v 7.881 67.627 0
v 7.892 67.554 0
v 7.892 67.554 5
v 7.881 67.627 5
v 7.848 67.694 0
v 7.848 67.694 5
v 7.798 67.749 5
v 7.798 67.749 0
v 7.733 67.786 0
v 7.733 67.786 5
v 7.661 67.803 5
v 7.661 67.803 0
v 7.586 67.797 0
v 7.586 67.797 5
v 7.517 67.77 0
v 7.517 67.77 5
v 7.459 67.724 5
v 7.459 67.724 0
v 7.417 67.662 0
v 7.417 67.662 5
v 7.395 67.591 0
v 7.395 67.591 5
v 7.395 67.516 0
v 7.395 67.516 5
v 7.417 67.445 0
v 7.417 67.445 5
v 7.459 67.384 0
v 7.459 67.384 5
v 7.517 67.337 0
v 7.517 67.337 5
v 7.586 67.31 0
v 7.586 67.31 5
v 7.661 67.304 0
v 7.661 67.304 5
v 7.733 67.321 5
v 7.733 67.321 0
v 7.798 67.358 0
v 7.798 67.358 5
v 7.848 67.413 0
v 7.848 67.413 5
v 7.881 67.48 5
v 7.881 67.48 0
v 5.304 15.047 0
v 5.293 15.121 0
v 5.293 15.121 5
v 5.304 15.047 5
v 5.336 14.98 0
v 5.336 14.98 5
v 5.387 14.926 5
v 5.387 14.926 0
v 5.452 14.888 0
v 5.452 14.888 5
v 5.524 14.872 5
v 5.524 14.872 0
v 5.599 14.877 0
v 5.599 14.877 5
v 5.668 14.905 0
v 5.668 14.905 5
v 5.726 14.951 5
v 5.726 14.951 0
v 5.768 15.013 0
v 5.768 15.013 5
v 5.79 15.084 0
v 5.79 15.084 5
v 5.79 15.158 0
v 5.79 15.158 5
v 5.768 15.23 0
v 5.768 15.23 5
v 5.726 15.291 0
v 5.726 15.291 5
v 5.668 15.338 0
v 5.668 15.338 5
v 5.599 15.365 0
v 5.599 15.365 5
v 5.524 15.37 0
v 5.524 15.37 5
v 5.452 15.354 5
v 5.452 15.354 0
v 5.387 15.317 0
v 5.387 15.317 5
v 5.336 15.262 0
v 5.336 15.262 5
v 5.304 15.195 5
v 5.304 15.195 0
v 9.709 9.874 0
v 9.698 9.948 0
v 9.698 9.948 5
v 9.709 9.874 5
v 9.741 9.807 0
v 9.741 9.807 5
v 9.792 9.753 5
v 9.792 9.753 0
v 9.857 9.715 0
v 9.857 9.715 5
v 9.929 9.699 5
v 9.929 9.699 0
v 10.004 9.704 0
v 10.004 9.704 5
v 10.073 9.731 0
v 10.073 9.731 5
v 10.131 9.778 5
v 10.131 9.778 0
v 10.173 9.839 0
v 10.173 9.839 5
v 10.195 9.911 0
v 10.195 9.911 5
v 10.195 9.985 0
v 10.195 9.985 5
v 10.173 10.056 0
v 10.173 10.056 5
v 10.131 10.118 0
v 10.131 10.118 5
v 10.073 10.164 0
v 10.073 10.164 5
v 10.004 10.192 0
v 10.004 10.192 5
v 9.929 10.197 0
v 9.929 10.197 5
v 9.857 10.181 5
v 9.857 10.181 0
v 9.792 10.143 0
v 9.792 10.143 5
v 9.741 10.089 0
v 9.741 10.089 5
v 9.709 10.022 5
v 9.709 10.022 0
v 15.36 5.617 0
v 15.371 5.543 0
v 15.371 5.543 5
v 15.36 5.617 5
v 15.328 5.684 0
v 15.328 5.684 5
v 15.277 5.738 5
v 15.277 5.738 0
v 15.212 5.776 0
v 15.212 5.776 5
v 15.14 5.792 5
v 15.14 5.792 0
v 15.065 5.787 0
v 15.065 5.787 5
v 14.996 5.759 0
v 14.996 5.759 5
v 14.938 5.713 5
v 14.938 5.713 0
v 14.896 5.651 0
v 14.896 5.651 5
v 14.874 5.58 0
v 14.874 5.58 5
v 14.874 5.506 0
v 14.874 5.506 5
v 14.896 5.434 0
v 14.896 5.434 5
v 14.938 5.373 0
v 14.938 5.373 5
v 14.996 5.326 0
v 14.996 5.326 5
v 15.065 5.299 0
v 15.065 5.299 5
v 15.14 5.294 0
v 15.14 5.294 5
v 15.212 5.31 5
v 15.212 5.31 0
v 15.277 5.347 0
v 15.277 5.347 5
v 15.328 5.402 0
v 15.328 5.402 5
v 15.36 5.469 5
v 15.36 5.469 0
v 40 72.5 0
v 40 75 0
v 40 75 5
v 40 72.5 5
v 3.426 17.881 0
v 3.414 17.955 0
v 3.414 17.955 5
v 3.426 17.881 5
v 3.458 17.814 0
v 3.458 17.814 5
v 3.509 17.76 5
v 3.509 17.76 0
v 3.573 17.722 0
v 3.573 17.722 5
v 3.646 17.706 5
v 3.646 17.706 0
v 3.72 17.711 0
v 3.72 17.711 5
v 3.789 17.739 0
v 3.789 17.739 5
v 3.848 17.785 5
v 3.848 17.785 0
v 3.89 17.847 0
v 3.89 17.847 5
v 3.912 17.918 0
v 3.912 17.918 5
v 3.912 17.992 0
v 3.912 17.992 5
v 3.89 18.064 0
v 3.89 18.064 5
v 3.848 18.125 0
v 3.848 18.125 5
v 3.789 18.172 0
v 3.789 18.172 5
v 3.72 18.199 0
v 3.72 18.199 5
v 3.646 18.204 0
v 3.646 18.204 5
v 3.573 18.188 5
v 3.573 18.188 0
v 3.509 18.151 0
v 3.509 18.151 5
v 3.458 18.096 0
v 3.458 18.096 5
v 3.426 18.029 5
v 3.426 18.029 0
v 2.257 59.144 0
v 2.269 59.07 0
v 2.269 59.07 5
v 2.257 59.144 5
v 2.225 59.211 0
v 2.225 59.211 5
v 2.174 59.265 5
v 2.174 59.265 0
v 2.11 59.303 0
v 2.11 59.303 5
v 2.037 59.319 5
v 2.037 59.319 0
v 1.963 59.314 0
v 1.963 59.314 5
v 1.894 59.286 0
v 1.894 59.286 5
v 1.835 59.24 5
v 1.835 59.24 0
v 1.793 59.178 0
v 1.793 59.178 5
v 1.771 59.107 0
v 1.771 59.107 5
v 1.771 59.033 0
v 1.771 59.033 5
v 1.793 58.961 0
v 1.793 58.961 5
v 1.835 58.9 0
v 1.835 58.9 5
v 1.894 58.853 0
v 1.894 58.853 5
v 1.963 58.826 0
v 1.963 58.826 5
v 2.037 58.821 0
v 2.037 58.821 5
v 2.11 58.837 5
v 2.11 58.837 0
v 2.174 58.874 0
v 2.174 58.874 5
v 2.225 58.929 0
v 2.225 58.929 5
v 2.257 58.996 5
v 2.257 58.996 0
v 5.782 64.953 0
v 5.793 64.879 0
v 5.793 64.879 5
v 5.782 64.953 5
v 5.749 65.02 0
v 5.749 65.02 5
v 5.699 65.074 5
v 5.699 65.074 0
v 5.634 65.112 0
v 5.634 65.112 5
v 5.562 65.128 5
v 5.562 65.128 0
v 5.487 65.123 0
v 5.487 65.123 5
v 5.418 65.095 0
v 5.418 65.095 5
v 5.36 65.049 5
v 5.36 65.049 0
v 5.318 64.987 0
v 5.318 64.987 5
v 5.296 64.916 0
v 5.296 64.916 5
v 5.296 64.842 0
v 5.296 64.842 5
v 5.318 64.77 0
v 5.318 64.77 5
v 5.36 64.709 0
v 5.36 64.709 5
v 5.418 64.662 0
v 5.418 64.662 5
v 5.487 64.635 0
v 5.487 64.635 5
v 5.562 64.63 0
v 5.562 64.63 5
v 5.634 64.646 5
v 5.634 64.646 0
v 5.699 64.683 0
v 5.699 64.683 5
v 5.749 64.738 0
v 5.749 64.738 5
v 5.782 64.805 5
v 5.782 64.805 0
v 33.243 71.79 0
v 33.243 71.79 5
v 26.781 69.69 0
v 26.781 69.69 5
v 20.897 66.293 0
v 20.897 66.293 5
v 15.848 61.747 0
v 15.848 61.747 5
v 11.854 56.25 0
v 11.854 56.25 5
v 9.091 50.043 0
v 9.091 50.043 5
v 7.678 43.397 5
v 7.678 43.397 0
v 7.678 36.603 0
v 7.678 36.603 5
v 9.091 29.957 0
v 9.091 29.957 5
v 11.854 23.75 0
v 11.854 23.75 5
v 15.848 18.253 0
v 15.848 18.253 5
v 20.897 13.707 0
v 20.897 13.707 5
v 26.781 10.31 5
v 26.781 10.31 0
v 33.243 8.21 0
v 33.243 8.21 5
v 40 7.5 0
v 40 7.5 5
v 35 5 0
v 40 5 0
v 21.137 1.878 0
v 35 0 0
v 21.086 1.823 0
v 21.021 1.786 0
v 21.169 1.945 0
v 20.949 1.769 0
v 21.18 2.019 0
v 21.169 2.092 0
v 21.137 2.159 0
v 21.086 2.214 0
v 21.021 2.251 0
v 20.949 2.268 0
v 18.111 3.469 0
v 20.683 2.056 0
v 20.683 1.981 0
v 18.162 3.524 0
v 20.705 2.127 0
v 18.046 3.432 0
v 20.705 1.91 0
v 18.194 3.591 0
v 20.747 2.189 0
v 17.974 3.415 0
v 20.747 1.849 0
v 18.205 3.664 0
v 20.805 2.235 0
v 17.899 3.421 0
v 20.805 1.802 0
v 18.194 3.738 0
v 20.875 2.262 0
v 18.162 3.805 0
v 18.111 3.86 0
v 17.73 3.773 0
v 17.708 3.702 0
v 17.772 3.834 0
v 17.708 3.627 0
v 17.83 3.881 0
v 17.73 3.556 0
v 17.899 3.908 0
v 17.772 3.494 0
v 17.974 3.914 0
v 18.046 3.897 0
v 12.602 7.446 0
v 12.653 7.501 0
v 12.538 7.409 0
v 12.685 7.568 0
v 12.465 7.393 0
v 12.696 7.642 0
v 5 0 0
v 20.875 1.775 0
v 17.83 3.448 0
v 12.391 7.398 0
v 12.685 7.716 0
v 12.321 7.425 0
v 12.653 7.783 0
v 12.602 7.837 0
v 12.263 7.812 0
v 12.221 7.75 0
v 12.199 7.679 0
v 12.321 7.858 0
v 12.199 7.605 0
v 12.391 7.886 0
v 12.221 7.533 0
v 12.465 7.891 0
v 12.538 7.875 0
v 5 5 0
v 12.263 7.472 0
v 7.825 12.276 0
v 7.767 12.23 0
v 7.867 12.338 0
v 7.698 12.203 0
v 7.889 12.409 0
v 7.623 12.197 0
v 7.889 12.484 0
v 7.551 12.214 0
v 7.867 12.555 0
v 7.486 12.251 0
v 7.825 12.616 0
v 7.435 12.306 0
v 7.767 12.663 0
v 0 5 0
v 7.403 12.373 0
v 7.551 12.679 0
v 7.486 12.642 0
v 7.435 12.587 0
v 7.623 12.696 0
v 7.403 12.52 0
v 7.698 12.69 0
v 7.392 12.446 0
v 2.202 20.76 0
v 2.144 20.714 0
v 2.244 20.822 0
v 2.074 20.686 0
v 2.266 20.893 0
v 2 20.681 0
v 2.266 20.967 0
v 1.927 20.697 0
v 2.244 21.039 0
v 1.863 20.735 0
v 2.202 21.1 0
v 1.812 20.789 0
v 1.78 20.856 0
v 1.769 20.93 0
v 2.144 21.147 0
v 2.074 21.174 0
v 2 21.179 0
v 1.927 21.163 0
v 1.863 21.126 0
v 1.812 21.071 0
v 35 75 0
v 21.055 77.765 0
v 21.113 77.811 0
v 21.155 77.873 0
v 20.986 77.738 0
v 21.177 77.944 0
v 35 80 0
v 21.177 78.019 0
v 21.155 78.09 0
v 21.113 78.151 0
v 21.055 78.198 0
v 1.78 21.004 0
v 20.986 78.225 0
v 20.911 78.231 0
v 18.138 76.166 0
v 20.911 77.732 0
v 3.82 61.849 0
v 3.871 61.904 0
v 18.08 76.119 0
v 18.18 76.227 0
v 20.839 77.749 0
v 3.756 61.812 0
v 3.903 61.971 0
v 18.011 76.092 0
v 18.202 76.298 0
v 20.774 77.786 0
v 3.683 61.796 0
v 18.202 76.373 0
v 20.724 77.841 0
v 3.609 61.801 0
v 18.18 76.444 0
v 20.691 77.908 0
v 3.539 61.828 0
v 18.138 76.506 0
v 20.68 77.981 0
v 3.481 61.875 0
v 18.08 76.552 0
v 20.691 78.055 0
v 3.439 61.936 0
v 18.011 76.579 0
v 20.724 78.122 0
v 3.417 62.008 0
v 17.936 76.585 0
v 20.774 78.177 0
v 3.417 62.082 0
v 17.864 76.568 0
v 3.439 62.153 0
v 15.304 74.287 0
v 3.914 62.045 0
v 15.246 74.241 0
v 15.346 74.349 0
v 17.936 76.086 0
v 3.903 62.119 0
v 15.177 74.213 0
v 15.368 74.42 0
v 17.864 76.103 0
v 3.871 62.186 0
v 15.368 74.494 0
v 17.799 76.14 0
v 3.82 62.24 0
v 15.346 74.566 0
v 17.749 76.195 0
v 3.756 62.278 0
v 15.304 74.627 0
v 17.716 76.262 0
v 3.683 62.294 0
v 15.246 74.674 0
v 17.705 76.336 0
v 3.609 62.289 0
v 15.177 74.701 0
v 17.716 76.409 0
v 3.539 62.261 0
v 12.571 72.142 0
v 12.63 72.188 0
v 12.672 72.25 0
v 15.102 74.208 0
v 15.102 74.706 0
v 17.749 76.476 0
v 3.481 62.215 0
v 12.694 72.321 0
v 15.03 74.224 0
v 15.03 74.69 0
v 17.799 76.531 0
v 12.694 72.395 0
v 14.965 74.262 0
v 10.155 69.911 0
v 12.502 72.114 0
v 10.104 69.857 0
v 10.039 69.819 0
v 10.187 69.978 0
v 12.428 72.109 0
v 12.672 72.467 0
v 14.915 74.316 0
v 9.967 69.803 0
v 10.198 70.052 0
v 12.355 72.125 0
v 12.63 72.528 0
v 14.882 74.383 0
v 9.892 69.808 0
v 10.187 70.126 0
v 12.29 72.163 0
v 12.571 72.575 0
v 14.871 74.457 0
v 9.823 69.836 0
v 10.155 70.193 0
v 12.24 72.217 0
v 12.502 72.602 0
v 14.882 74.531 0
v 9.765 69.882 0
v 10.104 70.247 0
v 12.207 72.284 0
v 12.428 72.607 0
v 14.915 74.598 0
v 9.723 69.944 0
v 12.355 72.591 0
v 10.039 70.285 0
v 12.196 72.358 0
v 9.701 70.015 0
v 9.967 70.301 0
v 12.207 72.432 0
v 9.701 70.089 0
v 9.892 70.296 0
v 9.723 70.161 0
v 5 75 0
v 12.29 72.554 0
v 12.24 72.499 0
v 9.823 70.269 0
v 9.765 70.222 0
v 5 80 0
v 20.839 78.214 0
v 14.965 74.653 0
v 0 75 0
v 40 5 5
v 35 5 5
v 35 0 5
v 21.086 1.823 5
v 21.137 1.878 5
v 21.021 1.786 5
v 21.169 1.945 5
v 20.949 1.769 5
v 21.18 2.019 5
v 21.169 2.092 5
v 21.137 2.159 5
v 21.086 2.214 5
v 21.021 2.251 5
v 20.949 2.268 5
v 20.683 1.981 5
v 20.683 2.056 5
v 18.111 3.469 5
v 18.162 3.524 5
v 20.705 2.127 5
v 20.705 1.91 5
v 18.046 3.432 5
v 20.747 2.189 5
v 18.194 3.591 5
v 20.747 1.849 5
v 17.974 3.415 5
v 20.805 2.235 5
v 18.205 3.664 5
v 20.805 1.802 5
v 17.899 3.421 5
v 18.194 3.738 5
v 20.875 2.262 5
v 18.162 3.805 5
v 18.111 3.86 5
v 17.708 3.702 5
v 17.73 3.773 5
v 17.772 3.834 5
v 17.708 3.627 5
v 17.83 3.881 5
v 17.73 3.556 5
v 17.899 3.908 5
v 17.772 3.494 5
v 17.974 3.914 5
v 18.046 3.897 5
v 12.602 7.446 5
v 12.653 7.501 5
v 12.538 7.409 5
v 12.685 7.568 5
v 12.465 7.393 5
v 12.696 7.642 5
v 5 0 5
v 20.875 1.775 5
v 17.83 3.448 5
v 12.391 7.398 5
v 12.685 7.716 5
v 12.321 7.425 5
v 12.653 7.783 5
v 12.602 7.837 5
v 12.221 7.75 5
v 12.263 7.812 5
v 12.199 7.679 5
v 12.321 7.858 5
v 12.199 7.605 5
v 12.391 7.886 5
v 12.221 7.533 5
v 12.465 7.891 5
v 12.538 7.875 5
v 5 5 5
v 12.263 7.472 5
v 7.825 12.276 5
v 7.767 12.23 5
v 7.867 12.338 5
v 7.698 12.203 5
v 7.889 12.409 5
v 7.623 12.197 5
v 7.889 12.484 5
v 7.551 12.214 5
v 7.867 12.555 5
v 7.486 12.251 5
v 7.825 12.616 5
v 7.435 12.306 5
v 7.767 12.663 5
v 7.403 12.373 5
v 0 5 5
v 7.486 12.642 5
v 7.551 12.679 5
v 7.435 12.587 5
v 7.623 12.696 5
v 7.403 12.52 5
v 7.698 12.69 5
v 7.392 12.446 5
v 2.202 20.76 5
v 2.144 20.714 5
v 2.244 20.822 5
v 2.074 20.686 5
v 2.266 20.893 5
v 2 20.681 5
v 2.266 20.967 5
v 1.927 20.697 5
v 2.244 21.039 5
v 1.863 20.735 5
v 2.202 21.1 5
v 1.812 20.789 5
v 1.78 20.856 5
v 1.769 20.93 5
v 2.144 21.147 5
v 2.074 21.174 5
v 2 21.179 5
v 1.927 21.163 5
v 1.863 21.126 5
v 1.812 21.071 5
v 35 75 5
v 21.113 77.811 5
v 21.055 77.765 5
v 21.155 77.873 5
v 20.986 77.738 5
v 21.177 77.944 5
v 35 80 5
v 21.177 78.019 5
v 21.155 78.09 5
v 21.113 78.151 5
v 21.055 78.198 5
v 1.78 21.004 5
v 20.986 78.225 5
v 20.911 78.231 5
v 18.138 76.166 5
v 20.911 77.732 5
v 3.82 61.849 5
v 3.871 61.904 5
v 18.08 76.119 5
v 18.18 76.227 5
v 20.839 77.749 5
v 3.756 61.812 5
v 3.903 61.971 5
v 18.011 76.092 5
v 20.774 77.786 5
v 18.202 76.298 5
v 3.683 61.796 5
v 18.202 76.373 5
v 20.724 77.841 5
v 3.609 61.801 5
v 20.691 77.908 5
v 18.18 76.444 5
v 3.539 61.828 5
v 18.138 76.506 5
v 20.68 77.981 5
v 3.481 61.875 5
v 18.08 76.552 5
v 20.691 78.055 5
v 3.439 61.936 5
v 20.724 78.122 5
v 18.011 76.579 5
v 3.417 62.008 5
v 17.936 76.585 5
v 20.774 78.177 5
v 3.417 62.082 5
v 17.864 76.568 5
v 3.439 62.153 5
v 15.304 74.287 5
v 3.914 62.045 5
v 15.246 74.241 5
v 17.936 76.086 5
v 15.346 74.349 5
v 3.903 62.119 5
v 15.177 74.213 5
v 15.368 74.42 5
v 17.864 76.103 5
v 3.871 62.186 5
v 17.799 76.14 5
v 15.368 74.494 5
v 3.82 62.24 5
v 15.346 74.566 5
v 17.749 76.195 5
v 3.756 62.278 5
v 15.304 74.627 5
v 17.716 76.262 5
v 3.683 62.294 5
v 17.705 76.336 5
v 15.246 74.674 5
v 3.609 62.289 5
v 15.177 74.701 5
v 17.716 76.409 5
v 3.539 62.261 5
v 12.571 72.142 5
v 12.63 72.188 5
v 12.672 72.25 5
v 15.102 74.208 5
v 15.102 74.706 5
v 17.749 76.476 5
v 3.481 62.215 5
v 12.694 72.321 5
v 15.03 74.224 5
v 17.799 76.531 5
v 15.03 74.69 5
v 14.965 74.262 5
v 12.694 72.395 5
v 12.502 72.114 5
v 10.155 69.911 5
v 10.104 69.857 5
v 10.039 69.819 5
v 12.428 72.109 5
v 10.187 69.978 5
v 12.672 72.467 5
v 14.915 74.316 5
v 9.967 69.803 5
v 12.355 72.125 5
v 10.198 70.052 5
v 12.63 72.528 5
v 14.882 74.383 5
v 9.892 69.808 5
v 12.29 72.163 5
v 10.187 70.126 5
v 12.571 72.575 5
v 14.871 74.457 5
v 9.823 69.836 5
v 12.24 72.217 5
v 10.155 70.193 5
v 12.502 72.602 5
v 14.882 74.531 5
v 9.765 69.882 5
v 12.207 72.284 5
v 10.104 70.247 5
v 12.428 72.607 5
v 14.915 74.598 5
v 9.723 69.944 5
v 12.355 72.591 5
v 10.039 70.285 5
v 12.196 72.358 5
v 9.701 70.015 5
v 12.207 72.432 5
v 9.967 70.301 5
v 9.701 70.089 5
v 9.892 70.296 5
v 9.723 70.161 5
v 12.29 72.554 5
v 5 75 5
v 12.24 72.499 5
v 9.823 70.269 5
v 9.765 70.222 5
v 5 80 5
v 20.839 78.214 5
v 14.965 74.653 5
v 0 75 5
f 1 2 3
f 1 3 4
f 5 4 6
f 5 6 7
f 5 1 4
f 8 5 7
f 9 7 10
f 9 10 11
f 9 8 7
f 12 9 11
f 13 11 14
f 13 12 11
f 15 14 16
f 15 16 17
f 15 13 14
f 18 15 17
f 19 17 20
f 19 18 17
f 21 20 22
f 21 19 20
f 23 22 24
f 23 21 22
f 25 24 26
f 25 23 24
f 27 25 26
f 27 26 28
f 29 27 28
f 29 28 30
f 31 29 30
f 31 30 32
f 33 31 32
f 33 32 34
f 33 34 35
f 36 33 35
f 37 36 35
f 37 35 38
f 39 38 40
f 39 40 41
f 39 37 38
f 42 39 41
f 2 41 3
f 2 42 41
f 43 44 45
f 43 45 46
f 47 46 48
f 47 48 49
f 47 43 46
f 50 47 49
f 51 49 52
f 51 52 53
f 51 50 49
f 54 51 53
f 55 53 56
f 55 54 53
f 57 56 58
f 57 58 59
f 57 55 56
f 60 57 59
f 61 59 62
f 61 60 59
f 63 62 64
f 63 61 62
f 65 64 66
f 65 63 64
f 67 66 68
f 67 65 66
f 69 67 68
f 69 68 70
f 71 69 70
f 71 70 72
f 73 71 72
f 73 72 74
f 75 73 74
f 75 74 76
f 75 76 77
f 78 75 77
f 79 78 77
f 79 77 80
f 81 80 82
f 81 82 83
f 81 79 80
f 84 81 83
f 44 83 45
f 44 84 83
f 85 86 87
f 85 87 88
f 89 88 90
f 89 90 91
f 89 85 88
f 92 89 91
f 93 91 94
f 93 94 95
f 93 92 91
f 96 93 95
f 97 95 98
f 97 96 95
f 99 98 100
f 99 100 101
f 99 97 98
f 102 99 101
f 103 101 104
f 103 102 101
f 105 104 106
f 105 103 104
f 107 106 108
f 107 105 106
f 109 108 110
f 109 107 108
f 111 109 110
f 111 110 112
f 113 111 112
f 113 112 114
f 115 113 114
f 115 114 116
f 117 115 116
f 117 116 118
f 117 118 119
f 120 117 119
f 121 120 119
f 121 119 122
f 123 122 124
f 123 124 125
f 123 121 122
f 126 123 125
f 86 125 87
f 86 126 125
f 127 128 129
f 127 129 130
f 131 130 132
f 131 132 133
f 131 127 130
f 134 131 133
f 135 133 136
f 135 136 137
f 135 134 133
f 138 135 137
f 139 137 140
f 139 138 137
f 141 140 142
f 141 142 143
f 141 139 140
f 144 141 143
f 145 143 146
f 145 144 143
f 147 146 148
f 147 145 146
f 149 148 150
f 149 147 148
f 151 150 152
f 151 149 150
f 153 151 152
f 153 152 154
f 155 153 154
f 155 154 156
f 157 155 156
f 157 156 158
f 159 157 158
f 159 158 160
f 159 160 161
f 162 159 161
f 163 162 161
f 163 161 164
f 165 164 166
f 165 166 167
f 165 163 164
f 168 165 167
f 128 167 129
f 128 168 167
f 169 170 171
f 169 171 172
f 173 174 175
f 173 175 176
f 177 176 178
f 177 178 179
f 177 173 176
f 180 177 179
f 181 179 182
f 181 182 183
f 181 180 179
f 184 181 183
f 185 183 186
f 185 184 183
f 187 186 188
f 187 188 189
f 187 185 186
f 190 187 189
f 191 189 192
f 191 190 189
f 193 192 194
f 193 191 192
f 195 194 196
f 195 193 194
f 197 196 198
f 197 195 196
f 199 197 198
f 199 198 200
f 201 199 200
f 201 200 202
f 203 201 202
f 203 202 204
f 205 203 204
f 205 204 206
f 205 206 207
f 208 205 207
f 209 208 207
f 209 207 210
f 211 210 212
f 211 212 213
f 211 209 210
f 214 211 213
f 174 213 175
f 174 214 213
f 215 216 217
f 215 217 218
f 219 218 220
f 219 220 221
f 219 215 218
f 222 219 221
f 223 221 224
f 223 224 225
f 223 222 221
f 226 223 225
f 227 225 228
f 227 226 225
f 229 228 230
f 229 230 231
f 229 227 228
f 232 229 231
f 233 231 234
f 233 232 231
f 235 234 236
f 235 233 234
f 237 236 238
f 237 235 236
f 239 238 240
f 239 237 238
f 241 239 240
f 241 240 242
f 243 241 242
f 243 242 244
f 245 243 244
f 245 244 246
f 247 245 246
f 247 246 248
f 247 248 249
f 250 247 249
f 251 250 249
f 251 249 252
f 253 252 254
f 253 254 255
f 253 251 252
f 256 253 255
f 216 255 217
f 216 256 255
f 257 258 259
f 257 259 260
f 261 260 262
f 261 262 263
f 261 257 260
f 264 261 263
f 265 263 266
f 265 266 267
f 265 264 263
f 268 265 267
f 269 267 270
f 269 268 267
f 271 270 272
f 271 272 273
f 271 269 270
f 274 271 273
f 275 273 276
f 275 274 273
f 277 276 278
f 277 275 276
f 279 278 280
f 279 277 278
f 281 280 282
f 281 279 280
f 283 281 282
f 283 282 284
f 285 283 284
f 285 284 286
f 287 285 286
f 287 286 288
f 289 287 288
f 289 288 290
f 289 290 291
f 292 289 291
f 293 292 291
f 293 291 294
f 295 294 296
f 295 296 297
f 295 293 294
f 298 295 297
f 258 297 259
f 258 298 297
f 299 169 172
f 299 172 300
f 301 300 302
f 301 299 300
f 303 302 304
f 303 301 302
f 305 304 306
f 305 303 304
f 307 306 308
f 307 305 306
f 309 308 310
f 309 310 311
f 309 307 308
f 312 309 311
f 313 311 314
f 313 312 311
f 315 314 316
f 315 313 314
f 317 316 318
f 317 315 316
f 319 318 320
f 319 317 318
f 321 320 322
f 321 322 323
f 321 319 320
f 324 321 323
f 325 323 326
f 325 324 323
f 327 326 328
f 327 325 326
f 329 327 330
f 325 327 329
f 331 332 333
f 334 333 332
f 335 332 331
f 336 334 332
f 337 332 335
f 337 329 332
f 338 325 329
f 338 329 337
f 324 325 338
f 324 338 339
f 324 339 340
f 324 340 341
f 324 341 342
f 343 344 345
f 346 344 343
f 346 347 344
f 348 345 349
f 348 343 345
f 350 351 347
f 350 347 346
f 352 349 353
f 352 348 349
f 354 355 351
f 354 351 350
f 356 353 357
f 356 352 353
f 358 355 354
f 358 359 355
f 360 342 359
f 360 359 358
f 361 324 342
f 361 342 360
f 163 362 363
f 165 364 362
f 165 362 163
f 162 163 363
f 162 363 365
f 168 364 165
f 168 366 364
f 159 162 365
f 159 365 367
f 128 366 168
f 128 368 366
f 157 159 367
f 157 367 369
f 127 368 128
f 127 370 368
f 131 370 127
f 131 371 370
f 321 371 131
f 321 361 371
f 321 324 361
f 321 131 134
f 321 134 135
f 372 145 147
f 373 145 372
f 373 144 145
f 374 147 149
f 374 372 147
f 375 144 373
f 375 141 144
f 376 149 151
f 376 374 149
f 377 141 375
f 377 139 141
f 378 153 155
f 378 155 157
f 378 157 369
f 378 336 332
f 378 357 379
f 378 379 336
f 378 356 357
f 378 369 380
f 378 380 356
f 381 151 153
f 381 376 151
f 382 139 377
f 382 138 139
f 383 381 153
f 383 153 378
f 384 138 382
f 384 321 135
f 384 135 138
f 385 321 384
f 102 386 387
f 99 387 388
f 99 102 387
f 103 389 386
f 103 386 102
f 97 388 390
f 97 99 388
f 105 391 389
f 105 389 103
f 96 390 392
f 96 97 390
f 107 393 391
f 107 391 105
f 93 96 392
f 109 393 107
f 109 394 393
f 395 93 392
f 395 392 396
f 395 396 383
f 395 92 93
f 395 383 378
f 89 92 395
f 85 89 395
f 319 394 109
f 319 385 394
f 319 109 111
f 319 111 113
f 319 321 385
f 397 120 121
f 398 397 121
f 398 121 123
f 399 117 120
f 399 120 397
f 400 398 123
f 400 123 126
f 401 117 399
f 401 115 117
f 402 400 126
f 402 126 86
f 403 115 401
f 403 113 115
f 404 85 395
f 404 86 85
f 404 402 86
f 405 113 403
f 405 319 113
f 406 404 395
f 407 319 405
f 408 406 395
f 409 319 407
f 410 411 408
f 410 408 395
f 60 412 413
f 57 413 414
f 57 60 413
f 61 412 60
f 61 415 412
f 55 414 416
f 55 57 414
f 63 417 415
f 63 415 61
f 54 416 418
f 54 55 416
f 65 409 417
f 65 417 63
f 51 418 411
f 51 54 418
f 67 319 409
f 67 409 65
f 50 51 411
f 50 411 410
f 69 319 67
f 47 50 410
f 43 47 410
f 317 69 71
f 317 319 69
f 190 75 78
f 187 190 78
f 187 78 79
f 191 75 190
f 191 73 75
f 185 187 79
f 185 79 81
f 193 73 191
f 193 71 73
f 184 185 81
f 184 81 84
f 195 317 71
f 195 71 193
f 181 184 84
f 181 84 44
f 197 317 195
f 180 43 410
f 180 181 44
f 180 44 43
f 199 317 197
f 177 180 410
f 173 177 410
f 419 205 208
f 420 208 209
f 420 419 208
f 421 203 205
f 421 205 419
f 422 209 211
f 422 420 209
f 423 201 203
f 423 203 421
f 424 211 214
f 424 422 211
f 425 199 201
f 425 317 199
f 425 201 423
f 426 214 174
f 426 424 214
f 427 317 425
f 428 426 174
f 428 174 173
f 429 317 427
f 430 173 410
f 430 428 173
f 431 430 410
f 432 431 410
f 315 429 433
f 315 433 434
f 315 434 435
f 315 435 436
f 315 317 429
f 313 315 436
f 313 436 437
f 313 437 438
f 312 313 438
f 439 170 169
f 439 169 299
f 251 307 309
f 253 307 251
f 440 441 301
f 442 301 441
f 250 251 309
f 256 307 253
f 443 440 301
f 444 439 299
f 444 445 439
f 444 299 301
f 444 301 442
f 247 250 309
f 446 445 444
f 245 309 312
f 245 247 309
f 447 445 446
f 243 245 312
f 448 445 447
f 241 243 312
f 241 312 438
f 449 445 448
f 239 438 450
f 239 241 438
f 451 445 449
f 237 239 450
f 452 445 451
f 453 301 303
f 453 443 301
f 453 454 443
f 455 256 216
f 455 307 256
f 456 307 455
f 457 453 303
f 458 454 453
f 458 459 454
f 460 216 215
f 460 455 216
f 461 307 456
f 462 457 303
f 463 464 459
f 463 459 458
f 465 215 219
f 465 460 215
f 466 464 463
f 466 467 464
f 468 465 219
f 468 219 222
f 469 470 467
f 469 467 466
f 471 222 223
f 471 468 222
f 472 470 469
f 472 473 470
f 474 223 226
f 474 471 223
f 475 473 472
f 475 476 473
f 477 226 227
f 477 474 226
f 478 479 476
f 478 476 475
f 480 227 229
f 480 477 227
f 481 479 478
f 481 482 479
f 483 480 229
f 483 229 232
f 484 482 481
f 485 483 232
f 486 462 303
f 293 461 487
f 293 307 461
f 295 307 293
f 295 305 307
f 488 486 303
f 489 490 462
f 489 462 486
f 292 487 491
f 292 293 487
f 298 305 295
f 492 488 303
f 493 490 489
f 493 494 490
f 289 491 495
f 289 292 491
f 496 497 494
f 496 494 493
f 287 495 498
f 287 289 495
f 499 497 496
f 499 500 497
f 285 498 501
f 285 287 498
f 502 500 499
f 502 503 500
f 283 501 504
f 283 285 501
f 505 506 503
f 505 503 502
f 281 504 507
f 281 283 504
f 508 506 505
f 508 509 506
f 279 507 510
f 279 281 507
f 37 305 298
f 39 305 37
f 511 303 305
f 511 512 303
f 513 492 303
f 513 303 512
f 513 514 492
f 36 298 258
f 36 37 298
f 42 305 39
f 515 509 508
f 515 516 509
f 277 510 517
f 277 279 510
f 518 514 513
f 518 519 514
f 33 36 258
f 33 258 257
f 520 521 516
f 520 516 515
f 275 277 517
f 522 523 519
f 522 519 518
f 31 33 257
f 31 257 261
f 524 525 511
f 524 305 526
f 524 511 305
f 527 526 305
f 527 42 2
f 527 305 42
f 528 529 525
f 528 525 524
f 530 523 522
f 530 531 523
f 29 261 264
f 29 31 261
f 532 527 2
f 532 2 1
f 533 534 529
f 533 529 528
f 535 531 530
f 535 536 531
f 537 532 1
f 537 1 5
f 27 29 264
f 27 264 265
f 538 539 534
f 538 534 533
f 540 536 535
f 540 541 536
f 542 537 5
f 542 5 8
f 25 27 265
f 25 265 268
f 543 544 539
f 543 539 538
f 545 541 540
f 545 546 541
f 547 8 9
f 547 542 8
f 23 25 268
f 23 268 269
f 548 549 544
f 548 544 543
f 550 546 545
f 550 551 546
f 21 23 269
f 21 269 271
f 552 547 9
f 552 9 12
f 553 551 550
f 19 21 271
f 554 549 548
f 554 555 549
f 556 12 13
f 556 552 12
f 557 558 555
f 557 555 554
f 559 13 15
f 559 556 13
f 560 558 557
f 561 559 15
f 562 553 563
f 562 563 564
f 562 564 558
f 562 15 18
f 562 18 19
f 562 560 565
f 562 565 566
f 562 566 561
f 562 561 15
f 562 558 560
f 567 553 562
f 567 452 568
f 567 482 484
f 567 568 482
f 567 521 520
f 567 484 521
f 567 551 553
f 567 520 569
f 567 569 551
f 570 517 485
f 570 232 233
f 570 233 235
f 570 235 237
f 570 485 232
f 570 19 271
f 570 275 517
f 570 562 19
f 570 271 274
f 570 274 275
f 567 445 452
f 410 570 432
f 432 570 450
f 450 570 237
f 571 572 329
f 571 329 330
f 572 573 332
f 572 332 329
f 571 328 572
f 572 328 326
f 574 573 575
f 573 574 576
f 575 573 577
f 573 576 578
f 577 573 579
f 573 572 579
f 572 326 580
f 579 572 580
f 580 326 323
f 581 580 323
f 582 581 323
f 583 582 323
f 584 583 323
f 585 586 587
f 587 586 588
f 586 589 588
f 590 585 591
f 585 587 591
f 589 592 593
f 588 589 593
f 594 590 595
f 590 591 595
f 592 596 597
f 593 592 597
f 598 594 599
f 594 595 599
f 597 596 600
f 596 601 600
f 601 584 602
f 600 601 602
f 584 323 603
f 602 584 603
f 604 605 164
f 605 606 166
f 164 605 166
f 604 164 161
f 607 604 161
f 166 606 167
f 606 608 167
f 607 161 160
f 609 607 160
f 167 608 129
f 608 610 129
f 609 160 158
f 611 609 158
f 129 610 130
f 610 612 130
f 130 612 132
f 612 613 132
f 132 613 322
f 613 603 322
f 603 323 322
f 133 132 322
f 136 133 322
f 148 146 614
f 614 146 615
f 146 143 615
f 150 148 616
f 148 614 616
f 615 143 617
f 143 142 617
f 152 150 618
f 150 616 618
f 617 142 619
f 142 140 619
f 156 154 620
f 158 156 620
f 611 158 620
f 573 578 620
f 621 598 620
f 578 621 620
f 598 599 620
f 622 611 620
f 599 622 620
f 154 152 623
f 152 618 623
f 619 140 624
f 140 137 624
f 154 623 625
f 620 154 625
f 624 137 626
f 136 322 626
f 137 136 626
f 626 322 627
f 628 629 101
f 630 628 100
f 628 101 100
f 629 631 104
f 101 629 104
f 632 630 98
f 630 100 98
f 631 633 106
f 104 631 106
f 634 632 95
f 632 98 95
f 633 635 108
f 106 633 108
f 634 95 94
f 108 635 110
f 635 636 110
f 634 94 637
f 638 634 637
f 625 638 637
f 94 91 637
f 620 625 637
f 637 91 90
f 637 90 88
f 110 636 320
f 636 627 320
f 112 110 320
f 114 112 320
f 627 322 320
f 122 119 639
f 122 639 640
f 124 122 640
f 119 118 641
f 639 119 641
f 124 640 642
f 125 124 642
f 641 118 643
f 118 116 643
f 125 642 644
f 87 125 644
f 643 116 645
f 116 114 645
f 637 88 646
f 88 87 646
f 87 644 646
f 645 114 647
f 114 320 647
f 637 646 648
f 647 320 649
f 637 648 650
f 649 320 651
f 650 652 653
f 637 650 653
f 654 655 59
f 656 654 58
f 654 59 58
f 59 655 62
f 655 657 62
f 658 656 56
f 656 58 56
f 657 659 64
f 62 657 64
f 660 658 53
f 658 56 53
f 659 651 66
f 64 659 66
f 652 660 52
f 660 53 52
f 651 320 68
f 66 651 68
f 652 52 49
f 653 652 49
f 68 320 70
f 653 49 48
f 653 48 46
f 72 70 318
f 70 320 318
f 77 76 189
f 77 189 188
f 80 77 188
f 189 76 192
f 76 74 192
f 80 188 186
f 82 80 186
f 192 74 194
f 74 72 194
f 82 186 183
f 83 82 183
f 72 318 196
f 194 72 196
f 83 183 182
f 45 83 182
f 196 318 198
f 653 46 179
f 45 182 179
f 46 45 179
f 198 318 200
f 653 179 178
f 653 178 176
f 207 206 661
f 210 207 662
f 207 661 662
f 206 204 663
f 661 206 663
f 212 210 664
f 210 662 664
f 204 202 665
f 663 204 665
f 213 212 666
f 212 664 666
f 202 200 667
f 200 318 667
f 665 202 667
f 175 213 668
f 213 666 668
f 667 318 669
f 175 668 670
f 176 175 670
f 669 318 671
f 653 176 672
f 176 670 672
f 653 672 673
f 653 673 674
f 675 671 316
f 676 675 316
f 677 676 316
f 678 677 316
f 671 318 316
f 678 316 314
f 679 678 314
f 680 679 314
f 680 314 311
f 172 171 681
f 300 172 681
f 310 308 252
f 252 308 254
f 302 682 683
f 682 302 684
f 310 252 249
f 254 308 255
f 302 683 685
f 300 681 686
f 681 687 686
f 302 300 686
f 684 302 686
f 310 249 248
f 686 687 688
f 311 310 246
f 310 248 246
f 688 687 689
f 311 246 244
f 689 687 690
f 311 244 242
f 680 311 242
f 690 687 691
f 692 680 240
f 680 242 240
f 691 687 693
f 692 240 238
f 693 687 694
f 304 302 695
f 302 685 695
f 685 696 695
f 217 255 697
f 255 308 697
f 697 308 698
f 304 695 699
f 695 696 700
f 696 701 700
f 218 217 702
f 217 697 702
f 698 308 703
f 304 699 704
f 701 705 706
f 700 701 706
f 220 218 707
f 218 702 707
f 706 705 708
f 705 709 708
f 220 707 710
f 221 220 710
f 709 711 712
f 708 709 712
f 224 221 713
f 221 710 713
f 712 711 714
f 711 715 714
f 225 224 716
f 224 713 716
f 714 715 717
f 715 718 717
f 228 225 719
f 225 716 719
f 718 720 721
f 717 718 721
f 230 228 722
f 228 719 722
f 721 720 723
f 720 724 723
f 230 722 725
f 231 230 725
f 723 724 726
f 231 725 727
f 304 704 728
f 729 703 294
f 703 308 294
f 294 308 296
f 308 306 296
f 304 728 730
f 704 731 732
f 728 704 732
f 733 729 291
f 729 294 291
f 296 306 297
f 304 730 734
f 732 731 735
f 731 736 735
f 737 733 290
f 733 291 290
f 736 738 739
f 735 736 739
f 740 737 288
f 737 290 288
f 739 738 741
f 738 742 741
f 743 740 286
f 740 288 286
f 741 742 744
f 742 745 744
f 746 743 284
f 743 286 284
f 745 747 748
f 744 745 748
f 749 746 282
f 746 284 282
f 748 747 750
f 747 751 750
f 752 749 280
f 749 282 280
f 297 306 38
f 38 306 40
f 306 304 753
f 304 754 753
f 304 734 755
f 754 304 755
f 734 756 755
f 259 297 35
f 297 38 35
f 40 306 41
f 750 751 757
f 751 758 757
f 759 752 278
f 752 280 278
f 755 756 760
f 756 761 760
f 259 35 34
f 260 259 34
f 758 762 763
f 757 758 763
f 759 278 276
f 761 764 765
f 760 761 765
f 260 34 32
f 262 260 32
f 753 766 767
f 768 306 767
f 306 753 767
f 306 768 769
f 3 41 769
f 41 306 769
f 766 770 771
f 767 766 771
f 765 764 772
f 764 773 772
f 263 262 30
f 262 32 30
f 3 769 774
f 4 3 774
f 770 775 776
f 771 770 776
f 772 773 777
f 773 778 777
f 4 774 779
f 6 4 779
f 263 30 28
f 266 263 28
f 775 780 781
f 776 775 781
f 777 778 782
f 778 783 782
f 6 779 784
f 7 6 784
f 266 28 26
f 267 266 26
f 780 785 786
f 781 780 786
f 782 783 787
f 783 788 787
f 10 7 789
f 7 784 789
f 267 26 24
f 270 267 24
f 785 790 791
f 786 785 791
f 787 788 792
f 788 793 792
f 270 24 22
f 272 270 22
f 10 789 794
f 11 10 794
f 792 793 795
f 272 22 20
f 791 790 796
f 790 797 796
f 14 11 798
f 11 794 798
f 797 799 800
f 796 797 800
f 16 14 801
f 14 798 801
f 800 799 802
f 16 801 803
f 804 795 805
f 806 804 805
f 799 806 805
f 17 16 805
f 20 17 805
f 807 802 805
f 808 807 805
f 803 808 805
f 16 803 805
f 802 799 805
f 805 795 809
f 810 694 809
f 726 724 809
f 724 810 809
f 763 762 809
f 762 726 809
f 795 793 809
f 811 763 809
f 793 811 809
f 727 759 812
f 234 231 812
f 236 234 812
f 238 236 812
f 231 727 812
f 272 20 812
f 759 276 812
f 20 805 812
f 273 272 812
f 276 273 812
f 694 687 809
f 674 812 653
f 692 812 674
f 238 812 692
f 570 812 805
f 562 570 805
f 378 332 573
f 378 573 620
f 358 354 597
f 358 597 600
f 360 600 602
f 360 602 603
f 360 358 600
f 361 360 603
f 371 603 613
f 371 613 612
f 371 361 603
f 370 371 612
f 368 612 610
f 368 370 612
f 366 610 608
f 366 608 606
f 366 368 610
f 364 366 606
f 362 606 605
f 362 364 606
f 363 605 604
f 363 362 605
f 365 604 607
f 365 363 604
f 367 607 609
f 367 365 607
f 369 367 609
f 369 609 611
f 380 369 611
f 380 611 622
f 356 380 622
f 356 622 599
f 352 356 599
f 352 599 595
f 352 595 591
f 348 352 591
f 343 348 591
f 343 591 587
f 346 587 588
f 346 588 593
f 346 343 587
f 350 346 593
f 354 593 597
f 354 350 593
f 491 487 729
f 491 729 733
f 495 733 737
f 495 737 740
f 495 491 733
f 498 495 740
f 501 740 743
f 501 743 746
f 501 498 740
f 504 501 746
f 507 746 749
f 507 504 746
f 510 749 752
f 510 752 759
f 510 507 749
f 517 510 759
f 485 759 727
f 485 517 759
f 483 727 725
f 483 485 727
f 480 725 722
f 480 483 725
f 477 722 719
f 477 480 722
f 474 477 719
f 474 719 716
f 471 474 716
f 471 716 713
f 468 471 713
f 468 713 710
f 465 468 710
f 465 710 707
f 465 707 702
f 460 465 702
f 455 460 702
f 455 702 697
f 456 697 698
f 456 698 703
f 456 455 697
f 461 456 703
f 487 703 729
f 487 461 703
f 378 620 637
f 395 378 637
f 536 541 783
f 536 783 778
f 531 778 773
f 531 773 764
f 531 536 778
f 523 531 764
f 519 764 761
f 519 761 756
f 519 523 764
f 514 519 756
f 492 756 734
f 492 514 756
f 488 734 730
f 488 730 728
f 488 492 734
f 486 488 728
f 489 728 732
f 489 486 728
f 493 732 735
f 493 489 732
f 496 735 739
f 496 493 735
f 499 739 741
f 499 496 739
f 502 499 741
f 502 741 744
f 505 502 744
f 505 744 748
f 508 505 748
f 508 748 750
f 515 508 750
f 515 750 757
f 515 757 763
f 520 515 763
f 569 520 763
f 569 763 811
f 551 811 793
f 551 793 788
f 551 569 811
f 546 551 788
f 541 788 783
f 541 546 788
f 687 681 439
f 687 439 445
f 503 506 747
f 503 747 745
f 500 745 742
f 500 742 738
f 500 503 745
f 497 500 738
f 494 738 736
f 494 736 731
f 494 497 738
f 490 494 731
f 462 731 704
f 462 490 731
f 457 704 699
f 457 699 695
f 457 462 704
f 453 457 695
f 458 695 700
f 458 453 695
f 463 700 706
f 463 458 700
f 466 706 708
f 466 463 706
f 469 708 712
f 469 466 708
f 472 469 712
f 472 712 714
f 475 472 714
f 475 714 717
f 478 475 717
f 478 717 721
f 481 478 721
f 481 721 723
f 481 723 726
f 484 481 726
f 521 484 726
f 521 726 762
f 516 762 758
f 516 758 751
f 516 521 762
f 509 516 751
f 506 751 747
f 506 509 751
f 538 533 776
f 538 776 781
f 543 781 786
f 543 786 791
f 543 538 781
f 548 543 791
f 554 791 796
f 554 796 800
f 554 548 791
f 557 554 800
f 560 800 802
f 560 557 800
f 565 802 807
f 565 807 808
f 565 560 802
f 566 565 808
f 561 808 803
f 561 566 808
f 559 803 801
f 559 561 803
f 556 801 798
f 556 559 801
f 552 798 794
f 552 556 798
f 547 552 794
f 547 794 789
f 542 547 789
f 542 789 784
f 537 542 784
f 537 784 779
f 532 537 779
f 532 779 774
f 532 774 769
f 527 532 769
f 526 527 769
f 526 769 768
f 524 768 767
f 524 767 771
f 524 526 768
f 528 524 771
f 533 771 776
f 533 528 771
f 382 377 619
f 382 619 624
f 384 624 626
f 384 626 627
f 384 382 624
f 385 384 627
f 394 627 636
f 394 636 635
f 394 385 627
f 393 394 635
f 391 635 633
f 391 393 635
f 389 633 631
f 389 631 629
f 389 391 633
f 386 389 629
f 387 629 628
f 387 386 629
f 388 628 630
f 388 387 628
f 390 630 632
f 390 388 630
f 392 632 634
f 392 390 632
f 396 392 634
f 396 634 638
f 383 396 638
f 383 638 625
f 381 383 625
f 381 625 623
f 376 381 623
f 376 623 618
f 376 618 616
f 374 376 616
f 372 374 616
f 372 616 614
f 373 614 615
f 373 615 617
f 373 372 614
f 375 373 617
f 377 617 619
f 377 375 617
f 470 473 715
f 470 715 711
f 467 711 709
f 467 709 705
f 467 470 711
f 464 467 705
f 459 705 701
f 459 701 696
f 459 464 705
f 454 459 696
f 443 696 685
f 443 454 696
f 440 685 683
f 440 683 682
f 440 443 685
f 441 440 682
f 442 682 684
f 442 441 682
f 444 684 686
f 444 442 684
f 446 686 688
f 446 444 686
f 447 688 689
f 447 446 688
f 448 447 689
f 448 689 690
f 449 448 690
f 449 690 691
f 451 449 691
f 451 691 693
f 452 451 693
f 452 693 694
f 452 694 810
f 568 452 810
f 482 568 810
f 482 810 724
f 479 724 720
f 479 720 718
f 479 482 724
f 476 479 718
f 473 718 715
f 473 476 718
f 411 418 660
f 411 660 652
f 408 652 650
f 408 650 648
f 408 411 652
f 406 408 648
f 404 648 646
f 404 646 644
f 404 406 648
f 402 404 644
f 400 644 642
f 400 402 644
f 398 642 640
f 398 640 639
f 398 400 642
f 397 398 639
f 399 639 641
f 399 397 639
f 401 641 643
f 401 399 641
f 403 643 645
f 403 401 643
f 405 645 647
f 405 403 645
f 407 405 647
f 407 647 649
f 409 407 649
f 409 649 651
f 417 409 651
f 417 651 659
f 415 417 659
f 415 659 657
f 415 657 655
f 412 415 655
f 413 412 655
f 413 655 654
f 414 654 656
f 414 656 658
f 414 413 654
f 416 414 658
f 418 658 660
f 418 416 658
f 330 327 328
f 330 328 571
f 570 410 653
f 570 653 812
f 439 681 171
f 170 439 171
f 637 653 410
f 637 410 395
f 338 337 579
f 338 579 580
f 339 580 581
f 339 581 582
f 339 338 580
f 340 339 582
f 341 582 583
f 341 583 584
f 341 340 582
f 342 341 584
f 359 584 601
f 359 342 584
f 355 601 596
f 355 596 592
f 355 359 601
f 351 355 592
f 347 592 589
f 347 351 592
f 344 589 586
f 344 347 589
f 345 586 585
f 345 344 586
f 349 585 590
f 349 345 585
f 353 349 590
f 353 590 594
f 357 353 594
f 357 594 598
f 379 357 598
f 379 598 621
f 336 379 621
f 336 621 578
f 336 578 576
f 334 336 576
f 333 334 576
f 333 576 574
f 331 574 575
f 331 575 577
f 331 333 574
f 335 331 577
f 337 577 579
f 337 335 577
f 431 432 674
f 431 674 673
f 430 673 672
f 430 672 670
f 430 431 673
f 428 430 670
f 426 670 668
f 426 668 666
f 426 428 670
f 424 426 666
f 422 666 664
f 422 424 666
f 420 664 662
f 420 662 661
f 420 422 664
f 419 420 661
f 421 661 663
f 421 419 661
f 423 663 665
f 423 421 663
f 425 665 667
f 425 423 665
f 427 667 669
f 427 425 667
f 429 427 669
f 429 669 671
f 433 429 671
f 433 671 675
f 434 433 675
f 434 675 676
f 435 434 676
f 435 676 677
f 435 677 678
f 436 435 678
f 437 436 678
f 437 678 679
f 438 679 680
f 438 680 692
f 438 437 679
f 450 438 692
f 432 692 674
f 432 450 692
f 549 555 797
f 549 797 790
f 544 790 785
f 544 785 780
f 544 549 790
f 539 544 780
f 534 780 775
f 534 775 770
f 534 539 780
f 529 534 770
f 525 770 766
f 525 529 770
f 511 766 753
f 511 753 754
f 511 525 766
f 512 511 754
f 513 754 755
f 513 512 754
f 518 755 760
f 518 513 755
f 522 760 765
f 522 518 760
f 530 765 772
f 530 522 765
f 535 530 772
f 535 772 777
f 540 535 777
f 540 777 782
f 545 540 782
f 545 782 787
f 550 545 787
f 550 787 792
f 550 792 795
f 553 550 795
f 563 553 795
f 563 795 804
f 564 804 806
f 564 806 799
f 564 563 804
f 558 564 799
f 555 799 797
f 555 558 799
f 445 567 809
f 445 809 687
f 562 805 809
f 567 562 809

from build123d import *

# Parameters (mm, degrees)
ESQUISSE1_R             = 0.25
BOSS_EXTRU_1_DEPTH      = 5
ESQUISSE2_W             = 5
ESQUISSE2_H             = 5
ENL_V_MAT_EXTRU_1_DEPTH = 5


with BuildPart() as part:
    # Esquisse1 → Boss.-Extru.1 (new body)
    with BuildSketch(Plane.XY):
        with BuildLine():
            Line((0, 80), (40, 80))
            Line((40, 80), (40, 72.5))
            ThreePointArc((40, 72.5), (7.5, 40), (40, 7.5))
            Line((40, 7.5), (40, 0))
            Line((40, 0), (0, 0))
            Line((0, 0), (0, 80))
        make_face()
        with Locations((2.018546053, 59.069849399)):
            Circle(ESQUISSE1_R, mode=Mode.SUBTRACT)
        with Locations((7.641889366, 67.553632723)):
            Circle(ESQUISSE1_R, mode=Mode.SUBTRACT)
        with Locations((9.9479618, 70.0520382)):
            Circle(ESQUISSE1_R, mode=Mode.SUBTRACT)
        with Locations((3.664453699, 62.04491041)):
            Circle(ESQUISSE1_R, mode=Mode.SUBTRACT)
        with Locations((5.542908841, 64.878883995)):
            Circle(ESQUISSE1_R, mode=Mode.SUBTRACT)
        with Locations(Location((20.930150601, 77.981453947, 0), (0, 0, 180))):
            Circle(ESQUISSE1_R, mode=Mode.SUBTRACT)
        with Locations(Location((17.95508959, 76.335546301, 0), (0, 0, 180))):
            Circle(ESQUISSE1_R, mode=Mode.SUBTRACT)
        with Locations(Location((15.121116005, 74.457091159, 0), (0, 0, 180))):
            Circle(ESQUISSE1_R, mode=Mode.SUBTRACT)
        with Locations(Location((12.446367277, 72.358110634, 0), (0, 0, 180))):
            Circle(ESQUISSE1_R, mode=Mode.SUBTRACT)
        with Locations((12.446367277, 7.641889366)):
            Circle(ESQUISSE1_R, mode=Mode.SUBTRACT)
        with Locations((15.121116005, 5.542908841)):
            Circle(ESQUISSE1_R, mode=Mode.SUBTRACT)
        with Locations((17.95508959, 3.664453699)):
            Circle(ESQUISSE1_R, mode=Mode.SUBTRACT)
        with Locations((20.930150601, 2.018546053)):
            Circle(ESQUISSE1_R, mode=Mode.SUBTRACT)
        with Locations(Location((5.542908841, 15.121116005, 0), (0, 0, 180))):
            Circle(ESQUISSE1_R, mode=Mode.SUBTRACT)
        with Locations(Location((3.664453699, 17.95508959, 0), (0, 0, 180))):
            Circle(ESQUISSE1_R, mode=Mode.SUBTRACT)
        with Locations(Location((9.9479618, 9.9479618, 0), (0, 0, 180))):
            Circle(ESQUISSE1_R, mode=Mode.SUBTRACT)
        with Locations(Location((7.641889366, 12.446367277, 0), (0, 0, 180))):
            Circle(ESQUISSE1_R, mode=Mode.SUBTRACT)
        with Locations(Location((2.018546053, 20.930150601, 0), (0, 0, 180))):
            Circle(ESQUISSE1_R, mode=Mode.SUBTRACT)
    extrude(amount=BOSS_EXTRU_1_DEPTH)

    # Esquisse2 → Enlèv. mat.-Extru.1 (cut)
    with BuildSketch(Plane.XY.offset(5)):
        with Locations((2.5, 2.5)):
            Rectangle(ESQUISSE2_W, ESQUISSE2_H)
        with Locations((37.5, 2.5)):
            Rectangle(ESQUISSE2_W, ESQUISSE2_H)
        with Locations((37.5, 77.5)):
            Rectangle(ESQUISSE2_W, ESQUISSE2_H)
        with Locations((2.5, 77.5)):
            Rectangle(ESQUISSE2_W, ESQUISSE2_H)
    extrude(amount=-ENL_V_MAT_EXTRU_1_DEPTH, mode=Mode.SUBTRACT)


solid = part.part
